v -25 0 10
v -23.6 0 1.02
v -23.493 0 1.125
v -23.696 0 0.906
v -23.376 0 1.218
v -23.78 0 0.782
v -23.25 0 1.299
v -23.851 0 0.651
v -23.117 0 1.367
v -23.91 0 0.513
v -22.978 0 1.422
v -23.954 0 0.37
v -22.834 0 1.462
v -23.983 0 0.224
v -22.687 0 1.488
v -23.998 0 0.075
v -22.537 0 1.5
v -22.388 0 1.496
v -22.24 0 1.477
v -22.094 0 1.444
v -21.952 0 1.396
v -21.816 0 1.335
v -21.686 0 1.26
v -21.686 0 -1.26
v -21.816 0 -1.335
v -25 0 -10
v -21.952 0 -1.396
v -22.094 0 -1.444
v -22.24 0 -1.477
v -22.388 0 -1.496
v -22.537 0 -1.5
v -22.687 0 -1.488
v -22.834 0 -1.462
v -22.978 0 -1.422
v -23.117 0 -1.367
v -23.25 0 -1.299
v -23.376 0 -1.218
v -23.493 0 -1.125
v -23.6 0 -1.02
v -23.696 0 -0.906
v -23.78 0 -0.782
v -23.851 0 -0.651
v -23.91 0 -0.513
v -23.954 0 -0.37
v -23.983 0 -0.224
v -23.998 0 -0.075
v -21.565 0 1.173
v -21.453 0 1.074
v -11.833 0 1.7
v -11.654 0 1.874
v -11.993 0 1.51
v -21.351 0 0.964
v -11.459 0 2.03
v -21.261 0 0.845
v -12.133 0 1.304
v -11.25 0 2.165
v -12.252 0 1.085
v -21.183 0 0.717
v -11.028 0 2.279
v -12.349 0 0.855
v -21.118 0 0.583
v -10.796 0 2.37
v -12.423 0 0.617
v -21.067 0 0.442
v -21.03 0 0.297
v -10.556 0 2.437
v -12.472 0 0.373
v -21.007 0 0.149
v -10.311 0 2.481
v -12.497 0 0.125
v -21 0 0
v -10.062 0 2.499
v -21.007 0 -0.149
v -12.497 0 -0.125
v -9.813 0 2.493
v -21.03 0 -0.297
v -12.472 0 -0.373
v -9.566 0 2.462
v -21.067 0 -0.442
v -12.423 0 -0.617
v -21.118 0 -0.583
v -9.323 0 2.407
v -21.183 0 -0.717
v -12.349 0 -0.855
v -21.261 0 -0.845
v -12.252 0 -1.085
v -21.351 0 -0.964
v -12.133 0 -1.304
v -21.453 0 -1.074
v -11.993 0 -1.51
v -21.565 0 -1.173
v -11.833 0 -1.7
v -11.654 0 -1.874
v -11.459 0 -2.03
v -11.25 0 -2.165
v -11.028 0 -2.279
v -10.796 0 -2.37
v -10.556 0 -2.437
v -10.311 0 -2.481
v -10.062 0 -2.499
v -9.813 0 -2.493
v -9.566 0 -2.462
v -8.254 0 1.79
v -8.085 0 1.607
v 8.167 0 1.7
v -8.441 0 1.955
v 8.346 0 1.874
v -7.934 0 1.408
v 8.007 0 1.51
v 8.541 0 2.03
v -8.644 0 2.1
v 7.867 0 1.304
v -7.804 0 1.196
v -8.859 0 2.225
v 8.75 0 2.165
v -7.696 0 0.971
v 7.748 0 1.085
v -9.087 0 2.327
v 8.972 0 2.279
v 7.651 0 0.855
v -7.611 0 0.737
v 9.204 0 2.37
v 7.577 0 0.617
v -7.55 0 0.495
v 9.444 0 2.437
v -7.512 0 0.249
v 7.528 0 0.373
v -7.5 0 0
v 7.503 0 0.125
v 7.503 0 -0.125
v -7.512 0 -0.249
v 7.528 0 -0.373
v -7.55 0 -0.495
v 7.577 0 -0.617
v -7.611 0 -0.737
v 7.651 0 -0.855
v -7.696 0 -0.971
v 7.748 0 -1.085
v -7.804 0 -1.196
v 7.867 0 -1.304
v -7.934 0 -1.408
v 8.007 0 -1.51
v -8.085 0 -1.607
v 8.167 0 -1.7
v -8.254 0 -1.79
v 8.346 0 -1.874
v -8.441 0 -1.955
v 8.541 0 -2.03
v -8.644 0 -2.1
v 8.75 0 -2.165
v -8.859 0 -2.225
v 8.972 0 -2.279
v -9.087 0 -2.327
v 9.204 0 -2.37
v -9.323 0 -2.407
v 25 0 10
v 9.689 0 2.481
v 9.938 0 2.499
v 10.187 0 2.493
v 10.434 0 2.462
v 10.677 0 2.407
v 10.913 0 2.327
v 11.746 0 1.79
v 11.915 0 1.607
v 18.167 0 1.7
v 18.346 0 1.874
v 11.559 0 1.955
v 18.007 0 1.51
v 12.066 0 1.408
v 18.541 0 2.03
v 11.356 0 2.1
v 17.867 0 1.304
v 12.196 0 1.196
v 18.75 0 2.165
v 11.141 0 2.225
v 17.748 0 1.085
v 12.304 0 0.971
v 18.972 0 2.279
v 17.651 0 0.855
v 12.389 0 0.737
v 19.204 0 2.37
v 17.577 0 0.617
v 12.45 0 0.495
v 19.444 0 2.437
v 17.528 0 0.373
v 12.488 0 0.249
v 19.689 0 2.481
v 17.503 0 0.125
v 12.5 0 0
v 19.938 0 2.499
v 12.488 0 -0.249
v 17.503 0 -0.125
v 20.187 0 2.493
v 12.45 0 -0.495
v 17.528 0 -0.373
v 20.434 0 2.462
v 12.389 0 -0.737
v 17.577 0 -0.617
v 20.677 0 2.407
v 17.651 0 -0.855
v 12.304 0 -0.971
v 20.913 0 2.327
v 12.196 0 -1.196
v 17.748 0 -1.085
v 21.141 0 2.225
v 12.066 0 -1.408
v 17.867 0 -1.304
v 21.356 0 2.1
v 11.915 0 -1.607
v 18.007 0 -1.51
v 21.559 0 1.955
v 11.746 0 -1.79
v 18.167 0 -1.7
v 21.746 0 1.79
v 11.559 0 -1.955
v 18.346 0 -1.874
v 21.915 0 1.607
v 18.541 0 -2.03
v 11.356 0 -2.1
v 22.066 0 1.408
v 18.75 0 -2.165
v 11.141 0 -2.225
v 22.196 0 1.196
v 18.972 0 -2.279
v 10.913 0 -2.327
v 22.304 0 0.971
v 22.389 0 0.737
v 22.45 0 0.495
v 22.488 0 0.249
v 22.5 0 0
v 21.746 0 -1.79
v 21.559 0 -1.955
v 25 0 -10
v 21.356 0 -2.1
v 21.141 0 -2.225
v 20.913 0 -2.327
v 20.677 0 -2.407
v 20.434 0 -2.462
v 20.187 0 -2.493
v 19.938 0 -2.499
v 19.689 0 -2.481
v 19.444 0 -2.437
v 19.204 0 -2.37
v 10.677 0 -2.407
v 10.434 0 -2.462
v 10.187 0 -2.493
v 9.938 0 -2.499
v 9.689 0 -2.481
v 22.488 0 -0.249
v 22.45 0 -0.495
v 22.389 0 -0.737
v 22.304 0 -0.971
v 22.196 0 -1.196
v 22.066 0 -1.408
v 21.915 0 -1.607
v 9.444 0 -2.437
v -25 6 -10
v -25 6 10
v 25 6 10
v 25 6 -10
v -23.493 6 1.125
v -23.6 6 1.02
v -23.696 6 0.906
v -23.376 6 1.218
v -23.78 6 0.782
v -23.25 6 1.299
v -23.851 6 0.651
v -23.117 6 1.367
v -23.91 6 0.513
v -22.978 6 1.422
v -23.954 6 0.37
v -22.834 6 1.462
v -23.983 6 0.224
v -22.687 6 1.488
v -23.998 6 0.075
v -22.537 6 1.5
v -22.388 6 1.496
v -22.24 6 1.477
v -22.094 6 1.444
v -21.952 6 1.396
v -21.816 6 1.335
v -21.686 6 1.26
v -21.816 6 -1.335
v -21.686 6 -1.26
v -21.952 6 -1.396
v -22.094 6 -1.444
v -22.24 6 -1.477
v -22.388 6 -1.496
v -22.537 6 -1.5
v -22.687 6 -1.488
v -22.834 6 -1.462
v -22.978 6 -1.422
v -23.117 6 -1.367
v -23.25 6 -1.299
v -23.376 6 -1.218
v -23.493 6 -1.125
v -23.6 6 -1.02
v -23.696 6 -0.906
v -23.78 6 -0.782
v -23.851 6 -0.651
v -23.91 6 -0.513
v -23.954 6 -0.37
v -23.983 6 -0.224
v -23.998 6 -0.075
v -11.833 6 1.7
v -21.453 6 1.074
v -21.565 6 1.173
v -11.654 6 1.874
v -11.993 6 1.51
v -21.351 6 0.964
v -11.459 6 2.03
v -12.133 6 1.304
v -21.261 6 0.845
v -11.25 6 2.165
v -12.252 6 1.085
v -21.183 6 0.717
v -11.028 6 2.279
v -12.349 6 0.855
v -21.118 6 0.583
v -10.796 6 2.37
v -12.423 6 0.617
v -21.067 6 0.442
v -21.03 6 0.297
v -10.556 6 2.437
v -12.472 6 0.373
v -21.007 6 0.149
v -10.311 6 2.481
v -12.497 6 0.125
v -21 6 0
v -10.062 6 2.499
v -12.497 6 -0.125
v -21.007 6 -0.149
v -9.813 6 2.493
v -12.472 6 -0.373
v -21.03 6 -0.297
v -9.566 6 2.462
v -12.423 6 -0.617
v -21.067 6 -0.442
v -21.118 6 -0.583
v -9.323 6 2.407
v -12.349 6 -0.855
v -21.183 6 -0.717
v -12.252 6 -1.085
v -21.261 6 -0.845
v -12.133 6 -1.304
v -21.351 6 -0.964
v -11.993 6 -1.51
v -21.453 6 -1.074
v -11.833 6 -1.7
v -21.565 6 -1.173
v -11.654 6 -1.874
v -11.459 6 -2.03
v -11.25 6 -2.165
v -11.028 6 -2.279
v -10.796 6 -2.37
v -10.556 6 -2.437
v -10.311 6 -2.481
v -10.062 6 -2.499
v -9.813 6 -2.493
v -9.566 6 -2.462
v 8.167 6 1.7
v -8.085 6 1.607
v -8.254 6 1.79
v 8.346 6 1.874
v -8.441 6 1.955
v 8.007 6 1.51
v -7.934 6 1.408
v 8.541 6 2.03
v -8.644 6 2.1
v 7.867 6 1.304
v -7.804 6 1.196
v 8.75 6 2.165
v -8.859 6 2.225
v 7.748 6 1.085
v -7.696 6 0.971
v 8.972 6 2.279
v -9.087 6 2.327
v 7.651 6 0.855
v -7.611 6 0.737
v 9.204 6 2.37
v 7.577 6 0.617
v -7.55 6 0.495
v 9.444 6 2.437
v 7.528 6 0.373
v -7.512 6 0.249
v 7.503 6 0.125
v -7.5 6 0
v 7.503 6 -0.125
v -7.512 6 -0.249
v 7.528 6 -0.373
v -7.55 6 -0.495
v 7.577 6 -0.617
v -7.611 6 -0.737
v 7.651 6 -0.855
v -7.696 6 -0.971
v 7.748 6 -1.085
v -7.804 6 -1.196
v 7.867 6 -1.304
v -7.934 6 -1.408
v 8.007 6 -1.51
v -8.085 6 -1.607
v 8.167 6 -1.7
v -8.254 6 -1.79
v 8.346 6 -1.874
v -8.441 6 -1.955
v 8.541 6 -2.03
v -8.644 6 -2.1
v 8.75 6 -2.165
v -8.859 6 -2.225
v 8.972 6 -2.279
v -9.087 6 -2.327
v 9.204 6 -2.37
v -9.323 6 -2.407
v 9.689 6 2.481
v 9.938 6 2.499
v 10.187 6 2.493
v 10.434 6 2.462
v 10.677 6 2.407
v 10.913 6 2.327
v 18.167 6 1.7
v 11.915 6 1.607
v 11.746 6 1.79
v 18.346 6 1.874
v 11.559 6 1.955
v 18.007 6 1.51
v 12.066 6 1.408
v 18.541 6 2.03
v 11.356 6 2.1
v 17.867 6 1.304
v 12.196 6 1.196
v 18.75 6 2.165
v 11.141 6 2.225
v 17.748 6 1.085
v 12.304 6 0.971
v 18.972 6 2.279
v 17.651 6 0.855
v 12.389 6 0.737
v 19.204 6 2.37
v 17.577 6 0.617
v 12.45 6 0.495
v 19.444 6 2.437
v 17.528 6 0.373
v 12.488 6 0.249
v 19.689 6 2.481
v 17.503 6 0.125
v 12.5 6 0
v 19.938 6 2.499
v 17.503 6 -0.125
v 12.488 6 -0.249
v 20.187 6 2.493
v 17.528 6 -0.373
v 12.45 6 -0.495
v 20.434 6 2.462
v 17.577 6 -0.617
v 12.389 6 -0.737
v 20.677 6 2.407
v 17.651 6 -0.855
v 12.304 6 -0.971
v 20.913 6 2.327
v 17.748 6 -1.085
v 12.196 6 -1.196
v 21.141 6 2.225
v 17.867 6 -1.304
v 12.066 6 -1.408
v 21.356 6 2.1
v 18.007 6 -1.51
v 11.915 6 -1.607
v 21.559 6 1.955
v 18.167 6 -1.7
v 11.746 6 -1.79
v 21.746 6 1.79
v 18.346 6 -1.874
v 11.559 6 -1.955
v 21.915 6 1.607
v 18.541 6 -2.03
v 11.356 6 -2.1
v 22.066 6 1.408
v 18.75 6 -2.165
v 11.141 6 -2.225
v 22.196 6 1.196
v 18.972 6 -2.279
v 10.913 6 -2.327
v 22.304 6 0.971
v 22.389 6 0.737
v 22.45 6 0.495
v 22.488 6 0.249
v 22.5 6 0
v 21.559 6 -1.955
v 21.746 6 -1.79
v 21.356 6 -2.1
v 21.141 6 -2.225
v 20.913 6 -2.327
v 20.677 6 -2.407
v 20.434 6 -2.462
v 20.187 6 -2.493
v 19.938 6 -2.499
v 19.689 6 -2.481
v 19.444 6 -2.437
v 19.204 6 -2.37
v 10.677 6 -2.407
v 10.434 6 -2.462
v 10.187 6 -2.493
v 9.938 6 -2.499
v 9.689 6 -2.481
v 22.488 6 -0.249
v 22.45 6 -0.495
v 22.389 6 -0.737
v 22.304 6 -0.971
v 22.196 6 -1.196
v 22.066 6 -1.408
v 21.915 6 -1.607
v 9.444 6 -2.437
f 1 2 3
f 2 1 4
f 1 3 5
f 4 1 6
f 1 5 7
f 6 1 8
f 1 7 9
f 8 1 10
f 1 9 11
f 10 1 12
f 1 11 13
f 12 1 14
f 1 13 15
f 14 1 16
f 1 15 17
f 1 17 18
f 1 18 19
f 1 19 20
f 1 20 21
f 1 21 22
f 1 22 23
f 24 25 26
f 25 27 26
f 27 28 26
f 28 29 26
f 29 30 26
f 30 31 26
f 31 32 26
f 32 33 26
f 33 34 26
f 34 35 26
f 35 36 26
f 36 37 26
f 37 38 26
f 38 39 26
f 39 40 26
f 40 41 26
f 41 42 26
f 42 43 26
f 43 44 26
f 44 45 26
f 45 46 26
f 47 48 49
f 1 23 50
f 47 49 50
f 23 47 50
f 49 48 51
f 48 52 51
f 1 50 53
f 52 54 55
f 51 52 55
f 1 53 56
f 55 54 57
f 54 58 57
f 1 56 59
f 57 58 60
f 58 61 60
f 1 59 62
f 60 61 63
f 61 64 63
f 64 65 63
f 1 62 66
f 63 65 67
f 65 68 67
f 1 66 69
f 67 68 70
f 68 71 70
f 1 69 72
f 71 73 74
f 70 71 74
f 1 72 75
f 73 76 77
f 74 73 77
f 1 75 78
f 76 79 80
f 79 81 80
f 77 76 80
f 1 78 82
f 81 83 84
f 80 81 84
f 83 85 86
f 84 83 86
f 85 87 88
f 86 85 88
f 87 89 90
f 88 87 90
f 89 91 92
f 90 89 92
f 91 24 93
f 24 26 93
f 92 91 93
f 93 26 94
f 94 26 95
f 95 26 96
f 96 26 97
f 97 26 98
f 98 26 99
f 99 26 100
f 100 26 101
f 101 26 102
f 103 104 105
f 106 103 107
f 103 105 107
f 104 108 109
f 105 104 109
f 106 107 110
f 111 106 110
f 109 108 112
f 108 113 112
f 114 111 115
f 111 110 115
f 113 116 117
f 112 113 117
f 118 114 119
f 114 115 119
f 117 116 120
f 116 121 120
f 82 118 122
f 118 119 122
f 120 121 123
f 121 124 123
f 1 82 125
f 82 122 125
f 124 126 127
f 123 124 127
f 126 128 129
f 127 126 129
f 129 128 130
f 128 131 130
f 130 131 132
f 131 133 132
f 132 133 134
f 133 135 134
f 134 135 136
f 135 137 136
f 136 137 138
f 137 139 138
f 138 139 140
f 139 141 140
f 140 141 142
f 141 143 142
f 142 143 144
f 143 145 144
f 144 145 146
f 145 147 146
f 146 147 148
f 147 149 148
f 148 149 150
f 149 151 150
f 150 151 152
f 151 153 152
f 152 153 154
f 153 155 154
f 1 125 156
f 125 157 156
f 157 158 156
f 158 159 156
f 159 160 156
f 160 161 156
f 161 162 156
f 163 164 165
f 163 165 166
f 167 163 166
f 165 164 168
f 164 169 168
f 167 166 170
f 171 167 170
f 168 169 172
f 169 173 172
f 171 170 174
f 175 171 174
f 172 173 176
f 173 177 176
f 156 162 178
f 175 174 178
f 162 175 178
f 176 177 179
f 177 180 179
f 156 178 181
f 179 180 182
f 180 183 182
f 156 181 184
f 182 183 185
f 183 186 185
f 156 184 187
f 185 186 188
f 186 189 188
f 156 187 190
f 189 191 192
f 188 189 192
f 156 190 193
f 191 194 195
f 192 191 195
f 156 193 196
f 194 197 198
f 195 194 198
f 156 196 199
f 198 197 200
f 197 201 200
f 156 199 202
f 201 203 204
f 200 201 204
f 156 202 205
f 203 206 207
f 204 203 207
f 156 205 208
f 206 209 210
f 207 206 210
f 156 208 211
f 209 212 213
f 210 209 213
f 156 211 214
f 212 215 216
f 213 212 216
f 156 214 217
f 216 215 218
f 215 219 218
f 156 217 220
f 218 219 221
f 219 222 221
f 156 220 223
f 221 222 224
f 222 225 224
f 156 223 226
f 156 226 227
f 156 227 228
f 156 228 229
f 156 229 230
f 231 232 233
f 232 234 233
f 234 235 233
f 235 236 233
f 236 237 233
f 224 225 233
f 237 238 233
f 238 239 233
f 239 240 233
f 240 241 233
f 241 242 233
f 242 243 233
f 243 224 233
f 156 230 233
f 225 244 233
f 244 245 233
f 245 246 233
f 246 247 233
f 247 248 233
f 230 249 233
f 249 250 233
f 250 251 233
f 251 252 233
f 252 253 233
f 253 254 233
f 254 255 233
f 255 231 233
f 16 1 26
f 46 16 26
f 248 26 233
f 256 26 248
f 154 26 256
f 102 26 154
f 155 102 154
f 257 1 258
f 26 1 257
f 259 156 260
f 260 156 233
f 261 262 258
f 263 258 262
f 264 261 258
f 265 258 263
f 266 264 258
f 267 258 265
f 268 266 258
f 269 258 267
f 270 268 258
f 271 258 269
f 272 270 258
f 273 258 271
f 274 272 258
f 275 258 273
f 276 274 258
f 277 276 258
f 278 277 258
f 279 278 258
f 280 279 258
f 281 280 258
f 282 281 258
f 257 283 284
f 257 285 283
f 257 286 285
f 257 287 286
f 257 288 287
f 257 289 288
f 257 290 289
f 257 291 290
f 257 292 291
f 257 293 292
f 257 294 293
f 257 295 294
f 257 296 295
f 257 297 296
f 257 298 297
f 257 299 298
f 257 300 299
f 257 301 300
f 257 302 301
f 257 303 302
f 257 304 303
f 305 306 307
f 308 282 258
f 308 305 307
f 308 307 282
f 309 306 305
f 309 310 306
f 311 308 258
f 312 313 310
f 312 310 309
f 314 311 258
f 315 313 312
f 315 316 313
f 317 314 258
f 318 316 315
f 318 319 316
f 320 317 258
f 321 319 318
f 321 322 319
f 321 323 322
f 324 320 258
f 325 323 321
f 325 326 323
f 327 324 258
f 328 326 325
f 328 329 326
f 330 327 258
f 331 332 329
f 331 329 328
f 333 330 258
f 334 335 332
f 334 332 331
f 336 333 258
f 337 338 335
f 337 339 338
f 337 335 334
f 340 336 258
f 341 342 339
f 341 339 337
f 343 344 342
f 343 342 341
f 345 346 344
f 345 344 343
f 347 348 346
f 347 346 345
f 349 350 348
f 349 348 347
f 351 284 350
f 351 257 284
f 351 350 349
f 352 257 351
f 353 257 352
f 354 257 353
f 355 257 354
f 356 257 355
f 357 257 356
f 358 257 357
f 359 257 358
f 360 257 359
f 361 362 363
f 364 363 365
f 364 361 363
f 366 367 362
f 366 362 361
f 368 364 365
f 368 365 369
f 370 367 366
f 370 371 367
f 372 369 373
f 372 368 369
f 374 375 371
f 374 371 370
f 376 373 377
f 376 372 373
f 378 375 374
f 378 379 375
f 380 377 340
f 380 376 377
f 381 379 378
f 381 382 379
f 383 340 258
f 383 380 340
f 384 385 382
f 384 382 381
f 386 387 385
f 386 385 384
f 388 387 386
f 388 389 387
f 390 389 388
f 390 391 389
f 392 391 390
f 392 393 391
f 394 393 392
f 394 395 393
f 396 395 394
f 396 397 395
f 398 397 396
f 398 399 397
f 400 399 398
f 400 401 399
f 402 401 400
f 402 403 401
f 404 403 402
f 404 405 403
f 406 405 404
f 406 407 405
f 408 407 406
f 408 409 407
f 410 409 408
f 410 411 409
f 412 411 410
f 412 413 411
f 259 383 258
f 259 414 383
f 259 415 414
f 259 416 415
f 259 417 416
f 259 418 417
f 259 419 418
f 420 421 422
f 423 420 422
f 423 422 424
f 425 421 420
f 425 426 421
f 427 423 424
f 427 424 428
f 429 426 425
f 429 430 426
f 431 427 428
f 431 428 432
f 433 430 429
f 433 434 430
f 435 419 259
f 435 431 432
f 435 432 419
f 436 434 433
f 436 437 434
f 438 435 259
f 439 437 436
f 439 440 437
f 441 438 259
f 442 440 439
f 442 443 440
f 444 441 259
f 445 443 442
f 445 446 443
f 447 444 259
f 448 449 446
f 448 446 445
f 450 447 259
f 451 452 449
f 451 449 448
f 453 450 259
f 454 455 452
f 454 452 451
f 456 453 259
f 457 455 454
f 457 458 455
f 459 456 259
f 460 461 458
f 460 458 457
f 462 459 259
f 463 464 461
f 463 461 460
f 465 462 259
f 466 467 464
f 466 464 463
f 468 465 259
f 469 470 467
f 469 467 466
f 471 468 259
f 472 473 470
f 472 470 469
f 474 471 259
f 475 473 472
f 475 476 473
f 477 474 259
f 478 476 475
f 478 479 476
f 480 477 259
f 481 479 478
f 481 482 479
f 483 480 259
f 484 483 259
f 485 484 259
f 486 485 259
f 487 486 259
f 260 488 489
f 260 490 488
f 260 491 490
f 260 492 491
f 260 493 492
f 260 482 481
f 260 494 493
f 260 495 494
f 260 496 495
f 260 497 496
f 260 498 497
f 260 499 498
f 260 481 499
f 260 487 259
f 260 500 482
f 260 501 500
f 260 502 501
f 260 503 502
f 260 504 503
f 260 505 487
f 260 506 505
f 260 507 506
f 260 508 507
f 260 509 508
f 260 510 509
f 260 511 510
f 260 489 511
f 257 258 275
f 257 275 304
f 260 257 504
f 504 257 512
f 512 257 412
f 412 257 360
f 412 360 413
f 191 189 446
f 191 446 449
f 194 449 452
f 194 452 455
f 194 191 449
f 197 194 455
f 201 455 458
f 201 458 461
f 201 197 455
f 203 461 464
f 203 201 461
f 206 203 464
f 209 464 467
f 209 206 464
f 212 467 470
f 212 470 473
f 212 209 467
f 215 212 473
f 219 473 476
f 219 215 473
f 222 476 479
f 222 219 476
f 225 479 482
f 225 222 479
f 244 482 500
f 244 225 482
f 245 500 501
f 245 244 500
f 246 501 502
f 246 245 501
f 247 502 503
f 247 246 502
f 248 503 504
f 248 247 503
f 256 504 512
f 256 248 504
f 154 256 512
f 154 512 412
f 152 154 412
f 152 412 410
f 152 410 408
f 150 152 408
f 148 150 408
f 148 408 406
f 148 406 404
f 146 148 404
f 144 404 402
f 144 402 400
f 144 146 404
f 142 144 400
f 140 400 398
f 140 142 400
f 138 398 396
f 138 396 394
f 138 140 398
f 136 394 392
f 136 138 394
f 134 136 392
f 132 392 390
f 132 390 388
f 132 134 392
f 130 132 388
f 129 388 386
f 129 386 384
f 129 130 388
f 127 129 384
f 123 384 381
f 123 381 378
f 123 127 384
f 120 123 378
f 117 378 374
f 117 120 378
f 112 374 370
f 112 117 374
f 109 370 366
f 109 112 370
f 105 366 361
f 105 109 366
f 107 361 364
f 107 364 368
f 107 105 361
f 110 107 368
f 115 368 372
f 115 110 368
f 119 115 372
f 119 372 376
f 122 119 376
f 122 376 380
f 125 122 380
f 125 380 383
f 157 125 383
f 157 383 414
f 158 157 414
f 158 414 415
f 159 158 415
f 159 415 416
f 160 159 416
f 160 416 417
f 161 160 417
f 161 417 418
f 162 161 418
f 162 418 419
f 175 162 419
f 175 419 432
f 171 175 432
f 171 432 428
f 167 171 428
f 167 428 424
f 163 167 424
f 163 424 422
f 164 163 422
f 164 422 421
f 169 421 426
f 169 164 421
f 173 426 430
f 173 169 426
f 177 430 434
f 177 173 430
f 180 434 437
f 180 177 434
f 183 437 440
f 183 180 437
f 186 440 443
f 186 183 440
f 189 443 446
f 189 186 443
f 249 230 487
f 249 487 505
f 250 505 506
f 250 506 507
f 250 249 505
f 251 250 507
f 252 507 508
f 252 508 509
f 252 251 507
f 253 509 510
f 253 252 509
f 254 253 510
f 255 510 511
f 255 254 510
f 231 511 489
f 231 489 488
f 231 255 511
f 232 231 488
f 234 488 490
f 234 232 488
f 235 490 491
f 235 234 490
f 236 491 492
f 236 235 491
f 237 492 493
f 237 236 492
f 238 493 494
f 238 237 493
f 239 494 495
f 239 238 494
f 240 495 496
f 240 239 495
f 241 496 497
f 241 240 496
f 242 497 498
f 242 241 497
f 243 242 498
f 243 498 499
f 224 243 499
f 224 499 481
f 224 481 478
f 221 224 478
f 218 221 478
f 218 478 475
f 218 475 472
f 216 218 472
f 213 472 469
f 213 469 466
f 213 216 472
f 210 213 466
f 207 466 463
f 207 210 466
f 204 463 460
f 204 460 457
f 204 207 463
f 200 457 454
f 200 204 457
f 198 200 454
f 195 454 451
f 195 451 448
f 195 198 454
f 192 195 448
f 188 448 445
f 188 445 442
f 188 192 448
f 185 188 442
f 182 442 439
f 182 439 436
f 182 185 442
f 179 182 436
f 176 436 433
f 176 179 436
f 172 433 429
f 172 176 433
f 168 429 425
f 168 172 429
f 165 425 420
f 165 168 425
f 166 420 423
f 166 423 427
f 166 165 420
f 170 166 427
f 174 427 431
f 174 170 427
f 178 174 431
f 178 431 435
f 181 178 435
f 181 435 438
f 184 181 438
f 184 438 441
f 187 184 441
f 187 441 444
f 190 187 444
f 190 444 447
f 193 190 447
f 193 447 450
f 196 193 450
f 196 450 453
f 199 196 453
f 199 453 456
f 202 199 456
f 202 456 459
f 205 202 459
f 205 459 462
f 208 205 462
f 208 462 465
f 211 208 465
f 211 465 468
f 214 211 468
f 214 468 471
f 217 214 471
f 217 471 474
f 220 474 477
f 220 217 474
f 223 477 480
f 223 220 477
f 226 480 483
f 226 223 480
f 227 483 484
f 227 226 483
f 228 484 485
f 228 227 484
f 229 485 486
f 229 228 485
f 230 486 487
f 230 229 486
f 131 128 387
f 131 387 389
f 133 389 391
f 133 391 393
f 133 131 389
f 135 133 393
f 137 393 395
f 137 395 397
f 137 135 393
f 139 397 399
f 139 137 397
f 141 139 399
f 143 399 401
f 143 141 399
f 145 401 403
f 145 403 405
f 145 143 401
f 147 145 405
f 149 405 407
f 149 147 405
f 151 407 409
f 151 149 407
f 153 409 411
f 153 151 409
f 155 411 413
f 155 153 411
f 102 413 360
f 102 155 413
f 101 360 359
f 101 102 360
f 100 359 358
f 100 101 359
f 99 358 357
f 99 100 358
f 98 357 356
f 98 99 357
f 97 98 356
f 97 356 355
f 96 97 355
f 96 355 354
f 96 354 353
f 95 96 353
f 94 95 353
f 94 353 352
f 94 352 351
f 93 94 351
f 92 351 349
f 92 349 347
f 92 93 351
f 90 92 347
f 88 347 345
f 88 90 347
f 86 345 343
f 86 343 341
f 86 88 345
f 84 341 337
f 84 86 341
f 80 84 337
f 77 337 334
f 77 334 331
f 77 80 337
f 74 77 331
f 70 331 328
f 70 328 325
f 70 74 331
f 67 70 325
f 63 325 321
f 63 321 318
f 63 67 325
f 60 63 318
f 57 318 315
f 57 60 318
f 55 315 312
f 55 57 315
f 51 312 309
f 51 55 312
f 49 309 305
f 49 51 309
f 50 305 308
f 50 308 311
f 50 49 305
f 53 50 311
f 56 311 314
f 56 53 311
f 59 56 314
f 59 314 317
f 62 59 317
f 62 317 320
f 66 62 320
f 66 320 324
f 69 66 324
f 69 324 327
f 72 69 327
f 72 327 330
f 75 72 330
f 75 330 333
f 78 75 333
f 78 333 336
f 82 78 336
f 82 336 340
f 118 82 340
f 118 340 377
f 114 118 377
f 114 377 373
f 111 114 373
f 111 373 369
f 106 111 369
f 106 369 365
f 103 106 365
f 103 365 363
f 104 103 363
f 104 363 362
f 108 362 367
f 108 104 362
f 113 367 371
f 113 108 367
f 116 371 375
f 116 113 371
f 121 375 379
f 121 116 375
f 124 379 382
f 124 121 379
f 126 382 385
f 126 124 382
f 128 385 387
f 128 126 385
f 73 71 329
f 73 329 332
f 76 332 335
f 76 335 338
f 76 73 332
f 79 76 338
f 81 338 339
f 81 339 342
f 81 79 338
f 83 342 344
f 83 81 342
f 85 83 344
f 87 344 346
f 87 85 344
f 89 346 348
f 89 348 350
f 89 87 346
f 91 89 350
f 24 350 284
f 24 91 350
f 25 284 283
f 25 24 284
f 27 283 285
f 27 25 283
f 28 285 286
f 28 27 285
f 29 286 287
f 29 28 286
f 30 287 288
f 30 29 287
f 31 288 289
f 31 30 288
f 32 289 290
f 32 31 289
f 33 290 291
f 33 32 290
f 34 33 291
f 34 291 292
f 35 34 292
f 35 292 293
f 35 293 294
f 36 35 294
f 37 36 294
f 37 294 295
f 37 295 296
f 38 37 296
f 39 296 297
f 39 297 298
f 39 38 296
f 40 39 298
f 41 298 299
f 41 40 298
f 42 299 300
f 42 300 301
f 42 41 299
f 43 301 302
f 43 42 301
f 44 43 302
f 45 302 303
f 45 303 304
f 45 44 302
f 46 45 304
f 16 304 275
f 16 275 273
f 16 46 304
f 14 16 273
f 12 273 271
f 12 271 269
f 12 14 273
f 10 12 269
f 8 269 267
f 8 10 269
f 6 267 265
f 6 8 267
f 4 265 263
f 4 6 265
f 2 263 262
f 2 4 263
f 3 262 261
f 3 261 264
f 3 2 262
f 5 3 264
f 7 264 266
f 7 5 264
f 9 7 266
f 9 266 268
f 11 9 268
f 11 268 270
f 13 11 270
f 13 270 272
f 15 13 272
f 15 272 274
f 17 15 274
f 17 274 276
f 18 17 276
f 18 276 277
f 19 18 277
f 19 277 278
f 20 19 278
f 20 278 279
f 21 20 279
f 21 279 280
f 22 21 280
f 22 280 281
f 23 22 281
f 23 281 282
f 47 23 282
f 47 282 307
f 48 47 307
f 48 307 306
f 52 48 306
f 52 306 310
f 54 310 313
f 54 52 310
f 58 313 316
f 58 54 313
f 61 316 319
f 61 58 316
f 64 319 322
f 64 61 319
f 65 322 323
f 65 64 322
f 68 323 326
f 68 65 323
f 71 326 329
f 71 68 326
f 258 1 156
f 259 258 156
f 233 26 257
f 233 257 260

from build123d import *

# Parameters (mm, degrees)
SKETCH1_W           = 50
SKETCH1_H           = 20
BOSS_EXTRUDE1_DEPTH = 6
SKETCH1_3_R         = 2.5
SKETCH1_3_R_2       = 1.5
CUT_EXTRUDE1_DEPTH  = 6


with BuildPart() as part:
    # Sketch1 → Boss-Extrude1 (new body)
    with BuildSketch(Plane(origin=(0, 0, 0), x_dir=(1, 0, 0), z_dir=(0, 1, 0))):
        Rectangle(SKETCH1_W, SKETCH1_H)
    extrude(amount=BOSS_EXTRUDE1_DEPTH)

    # Sketch1<3> → Cut-Extrude1 (cut)
    with BuildSketch(Plane(origin=(0, 0, 0), x_dir=(1, 0, 0), z_dir=(0, 1, 0))):
        with Locations((20, 0)):
            Circle(SKETCH1_3_R)
        with Locations((-10, 0)):
            Circle(SKETCH1_3_R)
        with Locations((10, 0)):
            Circle(SKETCH1_3_R)
        with Locations((-22.5, 0)):
            Circle(SKETCH1_3_R_2)
    extrude(amount=CUT_EXTRUDE1_DEPTH, mode=Mode.SUBTRACT)


solid = part.part
